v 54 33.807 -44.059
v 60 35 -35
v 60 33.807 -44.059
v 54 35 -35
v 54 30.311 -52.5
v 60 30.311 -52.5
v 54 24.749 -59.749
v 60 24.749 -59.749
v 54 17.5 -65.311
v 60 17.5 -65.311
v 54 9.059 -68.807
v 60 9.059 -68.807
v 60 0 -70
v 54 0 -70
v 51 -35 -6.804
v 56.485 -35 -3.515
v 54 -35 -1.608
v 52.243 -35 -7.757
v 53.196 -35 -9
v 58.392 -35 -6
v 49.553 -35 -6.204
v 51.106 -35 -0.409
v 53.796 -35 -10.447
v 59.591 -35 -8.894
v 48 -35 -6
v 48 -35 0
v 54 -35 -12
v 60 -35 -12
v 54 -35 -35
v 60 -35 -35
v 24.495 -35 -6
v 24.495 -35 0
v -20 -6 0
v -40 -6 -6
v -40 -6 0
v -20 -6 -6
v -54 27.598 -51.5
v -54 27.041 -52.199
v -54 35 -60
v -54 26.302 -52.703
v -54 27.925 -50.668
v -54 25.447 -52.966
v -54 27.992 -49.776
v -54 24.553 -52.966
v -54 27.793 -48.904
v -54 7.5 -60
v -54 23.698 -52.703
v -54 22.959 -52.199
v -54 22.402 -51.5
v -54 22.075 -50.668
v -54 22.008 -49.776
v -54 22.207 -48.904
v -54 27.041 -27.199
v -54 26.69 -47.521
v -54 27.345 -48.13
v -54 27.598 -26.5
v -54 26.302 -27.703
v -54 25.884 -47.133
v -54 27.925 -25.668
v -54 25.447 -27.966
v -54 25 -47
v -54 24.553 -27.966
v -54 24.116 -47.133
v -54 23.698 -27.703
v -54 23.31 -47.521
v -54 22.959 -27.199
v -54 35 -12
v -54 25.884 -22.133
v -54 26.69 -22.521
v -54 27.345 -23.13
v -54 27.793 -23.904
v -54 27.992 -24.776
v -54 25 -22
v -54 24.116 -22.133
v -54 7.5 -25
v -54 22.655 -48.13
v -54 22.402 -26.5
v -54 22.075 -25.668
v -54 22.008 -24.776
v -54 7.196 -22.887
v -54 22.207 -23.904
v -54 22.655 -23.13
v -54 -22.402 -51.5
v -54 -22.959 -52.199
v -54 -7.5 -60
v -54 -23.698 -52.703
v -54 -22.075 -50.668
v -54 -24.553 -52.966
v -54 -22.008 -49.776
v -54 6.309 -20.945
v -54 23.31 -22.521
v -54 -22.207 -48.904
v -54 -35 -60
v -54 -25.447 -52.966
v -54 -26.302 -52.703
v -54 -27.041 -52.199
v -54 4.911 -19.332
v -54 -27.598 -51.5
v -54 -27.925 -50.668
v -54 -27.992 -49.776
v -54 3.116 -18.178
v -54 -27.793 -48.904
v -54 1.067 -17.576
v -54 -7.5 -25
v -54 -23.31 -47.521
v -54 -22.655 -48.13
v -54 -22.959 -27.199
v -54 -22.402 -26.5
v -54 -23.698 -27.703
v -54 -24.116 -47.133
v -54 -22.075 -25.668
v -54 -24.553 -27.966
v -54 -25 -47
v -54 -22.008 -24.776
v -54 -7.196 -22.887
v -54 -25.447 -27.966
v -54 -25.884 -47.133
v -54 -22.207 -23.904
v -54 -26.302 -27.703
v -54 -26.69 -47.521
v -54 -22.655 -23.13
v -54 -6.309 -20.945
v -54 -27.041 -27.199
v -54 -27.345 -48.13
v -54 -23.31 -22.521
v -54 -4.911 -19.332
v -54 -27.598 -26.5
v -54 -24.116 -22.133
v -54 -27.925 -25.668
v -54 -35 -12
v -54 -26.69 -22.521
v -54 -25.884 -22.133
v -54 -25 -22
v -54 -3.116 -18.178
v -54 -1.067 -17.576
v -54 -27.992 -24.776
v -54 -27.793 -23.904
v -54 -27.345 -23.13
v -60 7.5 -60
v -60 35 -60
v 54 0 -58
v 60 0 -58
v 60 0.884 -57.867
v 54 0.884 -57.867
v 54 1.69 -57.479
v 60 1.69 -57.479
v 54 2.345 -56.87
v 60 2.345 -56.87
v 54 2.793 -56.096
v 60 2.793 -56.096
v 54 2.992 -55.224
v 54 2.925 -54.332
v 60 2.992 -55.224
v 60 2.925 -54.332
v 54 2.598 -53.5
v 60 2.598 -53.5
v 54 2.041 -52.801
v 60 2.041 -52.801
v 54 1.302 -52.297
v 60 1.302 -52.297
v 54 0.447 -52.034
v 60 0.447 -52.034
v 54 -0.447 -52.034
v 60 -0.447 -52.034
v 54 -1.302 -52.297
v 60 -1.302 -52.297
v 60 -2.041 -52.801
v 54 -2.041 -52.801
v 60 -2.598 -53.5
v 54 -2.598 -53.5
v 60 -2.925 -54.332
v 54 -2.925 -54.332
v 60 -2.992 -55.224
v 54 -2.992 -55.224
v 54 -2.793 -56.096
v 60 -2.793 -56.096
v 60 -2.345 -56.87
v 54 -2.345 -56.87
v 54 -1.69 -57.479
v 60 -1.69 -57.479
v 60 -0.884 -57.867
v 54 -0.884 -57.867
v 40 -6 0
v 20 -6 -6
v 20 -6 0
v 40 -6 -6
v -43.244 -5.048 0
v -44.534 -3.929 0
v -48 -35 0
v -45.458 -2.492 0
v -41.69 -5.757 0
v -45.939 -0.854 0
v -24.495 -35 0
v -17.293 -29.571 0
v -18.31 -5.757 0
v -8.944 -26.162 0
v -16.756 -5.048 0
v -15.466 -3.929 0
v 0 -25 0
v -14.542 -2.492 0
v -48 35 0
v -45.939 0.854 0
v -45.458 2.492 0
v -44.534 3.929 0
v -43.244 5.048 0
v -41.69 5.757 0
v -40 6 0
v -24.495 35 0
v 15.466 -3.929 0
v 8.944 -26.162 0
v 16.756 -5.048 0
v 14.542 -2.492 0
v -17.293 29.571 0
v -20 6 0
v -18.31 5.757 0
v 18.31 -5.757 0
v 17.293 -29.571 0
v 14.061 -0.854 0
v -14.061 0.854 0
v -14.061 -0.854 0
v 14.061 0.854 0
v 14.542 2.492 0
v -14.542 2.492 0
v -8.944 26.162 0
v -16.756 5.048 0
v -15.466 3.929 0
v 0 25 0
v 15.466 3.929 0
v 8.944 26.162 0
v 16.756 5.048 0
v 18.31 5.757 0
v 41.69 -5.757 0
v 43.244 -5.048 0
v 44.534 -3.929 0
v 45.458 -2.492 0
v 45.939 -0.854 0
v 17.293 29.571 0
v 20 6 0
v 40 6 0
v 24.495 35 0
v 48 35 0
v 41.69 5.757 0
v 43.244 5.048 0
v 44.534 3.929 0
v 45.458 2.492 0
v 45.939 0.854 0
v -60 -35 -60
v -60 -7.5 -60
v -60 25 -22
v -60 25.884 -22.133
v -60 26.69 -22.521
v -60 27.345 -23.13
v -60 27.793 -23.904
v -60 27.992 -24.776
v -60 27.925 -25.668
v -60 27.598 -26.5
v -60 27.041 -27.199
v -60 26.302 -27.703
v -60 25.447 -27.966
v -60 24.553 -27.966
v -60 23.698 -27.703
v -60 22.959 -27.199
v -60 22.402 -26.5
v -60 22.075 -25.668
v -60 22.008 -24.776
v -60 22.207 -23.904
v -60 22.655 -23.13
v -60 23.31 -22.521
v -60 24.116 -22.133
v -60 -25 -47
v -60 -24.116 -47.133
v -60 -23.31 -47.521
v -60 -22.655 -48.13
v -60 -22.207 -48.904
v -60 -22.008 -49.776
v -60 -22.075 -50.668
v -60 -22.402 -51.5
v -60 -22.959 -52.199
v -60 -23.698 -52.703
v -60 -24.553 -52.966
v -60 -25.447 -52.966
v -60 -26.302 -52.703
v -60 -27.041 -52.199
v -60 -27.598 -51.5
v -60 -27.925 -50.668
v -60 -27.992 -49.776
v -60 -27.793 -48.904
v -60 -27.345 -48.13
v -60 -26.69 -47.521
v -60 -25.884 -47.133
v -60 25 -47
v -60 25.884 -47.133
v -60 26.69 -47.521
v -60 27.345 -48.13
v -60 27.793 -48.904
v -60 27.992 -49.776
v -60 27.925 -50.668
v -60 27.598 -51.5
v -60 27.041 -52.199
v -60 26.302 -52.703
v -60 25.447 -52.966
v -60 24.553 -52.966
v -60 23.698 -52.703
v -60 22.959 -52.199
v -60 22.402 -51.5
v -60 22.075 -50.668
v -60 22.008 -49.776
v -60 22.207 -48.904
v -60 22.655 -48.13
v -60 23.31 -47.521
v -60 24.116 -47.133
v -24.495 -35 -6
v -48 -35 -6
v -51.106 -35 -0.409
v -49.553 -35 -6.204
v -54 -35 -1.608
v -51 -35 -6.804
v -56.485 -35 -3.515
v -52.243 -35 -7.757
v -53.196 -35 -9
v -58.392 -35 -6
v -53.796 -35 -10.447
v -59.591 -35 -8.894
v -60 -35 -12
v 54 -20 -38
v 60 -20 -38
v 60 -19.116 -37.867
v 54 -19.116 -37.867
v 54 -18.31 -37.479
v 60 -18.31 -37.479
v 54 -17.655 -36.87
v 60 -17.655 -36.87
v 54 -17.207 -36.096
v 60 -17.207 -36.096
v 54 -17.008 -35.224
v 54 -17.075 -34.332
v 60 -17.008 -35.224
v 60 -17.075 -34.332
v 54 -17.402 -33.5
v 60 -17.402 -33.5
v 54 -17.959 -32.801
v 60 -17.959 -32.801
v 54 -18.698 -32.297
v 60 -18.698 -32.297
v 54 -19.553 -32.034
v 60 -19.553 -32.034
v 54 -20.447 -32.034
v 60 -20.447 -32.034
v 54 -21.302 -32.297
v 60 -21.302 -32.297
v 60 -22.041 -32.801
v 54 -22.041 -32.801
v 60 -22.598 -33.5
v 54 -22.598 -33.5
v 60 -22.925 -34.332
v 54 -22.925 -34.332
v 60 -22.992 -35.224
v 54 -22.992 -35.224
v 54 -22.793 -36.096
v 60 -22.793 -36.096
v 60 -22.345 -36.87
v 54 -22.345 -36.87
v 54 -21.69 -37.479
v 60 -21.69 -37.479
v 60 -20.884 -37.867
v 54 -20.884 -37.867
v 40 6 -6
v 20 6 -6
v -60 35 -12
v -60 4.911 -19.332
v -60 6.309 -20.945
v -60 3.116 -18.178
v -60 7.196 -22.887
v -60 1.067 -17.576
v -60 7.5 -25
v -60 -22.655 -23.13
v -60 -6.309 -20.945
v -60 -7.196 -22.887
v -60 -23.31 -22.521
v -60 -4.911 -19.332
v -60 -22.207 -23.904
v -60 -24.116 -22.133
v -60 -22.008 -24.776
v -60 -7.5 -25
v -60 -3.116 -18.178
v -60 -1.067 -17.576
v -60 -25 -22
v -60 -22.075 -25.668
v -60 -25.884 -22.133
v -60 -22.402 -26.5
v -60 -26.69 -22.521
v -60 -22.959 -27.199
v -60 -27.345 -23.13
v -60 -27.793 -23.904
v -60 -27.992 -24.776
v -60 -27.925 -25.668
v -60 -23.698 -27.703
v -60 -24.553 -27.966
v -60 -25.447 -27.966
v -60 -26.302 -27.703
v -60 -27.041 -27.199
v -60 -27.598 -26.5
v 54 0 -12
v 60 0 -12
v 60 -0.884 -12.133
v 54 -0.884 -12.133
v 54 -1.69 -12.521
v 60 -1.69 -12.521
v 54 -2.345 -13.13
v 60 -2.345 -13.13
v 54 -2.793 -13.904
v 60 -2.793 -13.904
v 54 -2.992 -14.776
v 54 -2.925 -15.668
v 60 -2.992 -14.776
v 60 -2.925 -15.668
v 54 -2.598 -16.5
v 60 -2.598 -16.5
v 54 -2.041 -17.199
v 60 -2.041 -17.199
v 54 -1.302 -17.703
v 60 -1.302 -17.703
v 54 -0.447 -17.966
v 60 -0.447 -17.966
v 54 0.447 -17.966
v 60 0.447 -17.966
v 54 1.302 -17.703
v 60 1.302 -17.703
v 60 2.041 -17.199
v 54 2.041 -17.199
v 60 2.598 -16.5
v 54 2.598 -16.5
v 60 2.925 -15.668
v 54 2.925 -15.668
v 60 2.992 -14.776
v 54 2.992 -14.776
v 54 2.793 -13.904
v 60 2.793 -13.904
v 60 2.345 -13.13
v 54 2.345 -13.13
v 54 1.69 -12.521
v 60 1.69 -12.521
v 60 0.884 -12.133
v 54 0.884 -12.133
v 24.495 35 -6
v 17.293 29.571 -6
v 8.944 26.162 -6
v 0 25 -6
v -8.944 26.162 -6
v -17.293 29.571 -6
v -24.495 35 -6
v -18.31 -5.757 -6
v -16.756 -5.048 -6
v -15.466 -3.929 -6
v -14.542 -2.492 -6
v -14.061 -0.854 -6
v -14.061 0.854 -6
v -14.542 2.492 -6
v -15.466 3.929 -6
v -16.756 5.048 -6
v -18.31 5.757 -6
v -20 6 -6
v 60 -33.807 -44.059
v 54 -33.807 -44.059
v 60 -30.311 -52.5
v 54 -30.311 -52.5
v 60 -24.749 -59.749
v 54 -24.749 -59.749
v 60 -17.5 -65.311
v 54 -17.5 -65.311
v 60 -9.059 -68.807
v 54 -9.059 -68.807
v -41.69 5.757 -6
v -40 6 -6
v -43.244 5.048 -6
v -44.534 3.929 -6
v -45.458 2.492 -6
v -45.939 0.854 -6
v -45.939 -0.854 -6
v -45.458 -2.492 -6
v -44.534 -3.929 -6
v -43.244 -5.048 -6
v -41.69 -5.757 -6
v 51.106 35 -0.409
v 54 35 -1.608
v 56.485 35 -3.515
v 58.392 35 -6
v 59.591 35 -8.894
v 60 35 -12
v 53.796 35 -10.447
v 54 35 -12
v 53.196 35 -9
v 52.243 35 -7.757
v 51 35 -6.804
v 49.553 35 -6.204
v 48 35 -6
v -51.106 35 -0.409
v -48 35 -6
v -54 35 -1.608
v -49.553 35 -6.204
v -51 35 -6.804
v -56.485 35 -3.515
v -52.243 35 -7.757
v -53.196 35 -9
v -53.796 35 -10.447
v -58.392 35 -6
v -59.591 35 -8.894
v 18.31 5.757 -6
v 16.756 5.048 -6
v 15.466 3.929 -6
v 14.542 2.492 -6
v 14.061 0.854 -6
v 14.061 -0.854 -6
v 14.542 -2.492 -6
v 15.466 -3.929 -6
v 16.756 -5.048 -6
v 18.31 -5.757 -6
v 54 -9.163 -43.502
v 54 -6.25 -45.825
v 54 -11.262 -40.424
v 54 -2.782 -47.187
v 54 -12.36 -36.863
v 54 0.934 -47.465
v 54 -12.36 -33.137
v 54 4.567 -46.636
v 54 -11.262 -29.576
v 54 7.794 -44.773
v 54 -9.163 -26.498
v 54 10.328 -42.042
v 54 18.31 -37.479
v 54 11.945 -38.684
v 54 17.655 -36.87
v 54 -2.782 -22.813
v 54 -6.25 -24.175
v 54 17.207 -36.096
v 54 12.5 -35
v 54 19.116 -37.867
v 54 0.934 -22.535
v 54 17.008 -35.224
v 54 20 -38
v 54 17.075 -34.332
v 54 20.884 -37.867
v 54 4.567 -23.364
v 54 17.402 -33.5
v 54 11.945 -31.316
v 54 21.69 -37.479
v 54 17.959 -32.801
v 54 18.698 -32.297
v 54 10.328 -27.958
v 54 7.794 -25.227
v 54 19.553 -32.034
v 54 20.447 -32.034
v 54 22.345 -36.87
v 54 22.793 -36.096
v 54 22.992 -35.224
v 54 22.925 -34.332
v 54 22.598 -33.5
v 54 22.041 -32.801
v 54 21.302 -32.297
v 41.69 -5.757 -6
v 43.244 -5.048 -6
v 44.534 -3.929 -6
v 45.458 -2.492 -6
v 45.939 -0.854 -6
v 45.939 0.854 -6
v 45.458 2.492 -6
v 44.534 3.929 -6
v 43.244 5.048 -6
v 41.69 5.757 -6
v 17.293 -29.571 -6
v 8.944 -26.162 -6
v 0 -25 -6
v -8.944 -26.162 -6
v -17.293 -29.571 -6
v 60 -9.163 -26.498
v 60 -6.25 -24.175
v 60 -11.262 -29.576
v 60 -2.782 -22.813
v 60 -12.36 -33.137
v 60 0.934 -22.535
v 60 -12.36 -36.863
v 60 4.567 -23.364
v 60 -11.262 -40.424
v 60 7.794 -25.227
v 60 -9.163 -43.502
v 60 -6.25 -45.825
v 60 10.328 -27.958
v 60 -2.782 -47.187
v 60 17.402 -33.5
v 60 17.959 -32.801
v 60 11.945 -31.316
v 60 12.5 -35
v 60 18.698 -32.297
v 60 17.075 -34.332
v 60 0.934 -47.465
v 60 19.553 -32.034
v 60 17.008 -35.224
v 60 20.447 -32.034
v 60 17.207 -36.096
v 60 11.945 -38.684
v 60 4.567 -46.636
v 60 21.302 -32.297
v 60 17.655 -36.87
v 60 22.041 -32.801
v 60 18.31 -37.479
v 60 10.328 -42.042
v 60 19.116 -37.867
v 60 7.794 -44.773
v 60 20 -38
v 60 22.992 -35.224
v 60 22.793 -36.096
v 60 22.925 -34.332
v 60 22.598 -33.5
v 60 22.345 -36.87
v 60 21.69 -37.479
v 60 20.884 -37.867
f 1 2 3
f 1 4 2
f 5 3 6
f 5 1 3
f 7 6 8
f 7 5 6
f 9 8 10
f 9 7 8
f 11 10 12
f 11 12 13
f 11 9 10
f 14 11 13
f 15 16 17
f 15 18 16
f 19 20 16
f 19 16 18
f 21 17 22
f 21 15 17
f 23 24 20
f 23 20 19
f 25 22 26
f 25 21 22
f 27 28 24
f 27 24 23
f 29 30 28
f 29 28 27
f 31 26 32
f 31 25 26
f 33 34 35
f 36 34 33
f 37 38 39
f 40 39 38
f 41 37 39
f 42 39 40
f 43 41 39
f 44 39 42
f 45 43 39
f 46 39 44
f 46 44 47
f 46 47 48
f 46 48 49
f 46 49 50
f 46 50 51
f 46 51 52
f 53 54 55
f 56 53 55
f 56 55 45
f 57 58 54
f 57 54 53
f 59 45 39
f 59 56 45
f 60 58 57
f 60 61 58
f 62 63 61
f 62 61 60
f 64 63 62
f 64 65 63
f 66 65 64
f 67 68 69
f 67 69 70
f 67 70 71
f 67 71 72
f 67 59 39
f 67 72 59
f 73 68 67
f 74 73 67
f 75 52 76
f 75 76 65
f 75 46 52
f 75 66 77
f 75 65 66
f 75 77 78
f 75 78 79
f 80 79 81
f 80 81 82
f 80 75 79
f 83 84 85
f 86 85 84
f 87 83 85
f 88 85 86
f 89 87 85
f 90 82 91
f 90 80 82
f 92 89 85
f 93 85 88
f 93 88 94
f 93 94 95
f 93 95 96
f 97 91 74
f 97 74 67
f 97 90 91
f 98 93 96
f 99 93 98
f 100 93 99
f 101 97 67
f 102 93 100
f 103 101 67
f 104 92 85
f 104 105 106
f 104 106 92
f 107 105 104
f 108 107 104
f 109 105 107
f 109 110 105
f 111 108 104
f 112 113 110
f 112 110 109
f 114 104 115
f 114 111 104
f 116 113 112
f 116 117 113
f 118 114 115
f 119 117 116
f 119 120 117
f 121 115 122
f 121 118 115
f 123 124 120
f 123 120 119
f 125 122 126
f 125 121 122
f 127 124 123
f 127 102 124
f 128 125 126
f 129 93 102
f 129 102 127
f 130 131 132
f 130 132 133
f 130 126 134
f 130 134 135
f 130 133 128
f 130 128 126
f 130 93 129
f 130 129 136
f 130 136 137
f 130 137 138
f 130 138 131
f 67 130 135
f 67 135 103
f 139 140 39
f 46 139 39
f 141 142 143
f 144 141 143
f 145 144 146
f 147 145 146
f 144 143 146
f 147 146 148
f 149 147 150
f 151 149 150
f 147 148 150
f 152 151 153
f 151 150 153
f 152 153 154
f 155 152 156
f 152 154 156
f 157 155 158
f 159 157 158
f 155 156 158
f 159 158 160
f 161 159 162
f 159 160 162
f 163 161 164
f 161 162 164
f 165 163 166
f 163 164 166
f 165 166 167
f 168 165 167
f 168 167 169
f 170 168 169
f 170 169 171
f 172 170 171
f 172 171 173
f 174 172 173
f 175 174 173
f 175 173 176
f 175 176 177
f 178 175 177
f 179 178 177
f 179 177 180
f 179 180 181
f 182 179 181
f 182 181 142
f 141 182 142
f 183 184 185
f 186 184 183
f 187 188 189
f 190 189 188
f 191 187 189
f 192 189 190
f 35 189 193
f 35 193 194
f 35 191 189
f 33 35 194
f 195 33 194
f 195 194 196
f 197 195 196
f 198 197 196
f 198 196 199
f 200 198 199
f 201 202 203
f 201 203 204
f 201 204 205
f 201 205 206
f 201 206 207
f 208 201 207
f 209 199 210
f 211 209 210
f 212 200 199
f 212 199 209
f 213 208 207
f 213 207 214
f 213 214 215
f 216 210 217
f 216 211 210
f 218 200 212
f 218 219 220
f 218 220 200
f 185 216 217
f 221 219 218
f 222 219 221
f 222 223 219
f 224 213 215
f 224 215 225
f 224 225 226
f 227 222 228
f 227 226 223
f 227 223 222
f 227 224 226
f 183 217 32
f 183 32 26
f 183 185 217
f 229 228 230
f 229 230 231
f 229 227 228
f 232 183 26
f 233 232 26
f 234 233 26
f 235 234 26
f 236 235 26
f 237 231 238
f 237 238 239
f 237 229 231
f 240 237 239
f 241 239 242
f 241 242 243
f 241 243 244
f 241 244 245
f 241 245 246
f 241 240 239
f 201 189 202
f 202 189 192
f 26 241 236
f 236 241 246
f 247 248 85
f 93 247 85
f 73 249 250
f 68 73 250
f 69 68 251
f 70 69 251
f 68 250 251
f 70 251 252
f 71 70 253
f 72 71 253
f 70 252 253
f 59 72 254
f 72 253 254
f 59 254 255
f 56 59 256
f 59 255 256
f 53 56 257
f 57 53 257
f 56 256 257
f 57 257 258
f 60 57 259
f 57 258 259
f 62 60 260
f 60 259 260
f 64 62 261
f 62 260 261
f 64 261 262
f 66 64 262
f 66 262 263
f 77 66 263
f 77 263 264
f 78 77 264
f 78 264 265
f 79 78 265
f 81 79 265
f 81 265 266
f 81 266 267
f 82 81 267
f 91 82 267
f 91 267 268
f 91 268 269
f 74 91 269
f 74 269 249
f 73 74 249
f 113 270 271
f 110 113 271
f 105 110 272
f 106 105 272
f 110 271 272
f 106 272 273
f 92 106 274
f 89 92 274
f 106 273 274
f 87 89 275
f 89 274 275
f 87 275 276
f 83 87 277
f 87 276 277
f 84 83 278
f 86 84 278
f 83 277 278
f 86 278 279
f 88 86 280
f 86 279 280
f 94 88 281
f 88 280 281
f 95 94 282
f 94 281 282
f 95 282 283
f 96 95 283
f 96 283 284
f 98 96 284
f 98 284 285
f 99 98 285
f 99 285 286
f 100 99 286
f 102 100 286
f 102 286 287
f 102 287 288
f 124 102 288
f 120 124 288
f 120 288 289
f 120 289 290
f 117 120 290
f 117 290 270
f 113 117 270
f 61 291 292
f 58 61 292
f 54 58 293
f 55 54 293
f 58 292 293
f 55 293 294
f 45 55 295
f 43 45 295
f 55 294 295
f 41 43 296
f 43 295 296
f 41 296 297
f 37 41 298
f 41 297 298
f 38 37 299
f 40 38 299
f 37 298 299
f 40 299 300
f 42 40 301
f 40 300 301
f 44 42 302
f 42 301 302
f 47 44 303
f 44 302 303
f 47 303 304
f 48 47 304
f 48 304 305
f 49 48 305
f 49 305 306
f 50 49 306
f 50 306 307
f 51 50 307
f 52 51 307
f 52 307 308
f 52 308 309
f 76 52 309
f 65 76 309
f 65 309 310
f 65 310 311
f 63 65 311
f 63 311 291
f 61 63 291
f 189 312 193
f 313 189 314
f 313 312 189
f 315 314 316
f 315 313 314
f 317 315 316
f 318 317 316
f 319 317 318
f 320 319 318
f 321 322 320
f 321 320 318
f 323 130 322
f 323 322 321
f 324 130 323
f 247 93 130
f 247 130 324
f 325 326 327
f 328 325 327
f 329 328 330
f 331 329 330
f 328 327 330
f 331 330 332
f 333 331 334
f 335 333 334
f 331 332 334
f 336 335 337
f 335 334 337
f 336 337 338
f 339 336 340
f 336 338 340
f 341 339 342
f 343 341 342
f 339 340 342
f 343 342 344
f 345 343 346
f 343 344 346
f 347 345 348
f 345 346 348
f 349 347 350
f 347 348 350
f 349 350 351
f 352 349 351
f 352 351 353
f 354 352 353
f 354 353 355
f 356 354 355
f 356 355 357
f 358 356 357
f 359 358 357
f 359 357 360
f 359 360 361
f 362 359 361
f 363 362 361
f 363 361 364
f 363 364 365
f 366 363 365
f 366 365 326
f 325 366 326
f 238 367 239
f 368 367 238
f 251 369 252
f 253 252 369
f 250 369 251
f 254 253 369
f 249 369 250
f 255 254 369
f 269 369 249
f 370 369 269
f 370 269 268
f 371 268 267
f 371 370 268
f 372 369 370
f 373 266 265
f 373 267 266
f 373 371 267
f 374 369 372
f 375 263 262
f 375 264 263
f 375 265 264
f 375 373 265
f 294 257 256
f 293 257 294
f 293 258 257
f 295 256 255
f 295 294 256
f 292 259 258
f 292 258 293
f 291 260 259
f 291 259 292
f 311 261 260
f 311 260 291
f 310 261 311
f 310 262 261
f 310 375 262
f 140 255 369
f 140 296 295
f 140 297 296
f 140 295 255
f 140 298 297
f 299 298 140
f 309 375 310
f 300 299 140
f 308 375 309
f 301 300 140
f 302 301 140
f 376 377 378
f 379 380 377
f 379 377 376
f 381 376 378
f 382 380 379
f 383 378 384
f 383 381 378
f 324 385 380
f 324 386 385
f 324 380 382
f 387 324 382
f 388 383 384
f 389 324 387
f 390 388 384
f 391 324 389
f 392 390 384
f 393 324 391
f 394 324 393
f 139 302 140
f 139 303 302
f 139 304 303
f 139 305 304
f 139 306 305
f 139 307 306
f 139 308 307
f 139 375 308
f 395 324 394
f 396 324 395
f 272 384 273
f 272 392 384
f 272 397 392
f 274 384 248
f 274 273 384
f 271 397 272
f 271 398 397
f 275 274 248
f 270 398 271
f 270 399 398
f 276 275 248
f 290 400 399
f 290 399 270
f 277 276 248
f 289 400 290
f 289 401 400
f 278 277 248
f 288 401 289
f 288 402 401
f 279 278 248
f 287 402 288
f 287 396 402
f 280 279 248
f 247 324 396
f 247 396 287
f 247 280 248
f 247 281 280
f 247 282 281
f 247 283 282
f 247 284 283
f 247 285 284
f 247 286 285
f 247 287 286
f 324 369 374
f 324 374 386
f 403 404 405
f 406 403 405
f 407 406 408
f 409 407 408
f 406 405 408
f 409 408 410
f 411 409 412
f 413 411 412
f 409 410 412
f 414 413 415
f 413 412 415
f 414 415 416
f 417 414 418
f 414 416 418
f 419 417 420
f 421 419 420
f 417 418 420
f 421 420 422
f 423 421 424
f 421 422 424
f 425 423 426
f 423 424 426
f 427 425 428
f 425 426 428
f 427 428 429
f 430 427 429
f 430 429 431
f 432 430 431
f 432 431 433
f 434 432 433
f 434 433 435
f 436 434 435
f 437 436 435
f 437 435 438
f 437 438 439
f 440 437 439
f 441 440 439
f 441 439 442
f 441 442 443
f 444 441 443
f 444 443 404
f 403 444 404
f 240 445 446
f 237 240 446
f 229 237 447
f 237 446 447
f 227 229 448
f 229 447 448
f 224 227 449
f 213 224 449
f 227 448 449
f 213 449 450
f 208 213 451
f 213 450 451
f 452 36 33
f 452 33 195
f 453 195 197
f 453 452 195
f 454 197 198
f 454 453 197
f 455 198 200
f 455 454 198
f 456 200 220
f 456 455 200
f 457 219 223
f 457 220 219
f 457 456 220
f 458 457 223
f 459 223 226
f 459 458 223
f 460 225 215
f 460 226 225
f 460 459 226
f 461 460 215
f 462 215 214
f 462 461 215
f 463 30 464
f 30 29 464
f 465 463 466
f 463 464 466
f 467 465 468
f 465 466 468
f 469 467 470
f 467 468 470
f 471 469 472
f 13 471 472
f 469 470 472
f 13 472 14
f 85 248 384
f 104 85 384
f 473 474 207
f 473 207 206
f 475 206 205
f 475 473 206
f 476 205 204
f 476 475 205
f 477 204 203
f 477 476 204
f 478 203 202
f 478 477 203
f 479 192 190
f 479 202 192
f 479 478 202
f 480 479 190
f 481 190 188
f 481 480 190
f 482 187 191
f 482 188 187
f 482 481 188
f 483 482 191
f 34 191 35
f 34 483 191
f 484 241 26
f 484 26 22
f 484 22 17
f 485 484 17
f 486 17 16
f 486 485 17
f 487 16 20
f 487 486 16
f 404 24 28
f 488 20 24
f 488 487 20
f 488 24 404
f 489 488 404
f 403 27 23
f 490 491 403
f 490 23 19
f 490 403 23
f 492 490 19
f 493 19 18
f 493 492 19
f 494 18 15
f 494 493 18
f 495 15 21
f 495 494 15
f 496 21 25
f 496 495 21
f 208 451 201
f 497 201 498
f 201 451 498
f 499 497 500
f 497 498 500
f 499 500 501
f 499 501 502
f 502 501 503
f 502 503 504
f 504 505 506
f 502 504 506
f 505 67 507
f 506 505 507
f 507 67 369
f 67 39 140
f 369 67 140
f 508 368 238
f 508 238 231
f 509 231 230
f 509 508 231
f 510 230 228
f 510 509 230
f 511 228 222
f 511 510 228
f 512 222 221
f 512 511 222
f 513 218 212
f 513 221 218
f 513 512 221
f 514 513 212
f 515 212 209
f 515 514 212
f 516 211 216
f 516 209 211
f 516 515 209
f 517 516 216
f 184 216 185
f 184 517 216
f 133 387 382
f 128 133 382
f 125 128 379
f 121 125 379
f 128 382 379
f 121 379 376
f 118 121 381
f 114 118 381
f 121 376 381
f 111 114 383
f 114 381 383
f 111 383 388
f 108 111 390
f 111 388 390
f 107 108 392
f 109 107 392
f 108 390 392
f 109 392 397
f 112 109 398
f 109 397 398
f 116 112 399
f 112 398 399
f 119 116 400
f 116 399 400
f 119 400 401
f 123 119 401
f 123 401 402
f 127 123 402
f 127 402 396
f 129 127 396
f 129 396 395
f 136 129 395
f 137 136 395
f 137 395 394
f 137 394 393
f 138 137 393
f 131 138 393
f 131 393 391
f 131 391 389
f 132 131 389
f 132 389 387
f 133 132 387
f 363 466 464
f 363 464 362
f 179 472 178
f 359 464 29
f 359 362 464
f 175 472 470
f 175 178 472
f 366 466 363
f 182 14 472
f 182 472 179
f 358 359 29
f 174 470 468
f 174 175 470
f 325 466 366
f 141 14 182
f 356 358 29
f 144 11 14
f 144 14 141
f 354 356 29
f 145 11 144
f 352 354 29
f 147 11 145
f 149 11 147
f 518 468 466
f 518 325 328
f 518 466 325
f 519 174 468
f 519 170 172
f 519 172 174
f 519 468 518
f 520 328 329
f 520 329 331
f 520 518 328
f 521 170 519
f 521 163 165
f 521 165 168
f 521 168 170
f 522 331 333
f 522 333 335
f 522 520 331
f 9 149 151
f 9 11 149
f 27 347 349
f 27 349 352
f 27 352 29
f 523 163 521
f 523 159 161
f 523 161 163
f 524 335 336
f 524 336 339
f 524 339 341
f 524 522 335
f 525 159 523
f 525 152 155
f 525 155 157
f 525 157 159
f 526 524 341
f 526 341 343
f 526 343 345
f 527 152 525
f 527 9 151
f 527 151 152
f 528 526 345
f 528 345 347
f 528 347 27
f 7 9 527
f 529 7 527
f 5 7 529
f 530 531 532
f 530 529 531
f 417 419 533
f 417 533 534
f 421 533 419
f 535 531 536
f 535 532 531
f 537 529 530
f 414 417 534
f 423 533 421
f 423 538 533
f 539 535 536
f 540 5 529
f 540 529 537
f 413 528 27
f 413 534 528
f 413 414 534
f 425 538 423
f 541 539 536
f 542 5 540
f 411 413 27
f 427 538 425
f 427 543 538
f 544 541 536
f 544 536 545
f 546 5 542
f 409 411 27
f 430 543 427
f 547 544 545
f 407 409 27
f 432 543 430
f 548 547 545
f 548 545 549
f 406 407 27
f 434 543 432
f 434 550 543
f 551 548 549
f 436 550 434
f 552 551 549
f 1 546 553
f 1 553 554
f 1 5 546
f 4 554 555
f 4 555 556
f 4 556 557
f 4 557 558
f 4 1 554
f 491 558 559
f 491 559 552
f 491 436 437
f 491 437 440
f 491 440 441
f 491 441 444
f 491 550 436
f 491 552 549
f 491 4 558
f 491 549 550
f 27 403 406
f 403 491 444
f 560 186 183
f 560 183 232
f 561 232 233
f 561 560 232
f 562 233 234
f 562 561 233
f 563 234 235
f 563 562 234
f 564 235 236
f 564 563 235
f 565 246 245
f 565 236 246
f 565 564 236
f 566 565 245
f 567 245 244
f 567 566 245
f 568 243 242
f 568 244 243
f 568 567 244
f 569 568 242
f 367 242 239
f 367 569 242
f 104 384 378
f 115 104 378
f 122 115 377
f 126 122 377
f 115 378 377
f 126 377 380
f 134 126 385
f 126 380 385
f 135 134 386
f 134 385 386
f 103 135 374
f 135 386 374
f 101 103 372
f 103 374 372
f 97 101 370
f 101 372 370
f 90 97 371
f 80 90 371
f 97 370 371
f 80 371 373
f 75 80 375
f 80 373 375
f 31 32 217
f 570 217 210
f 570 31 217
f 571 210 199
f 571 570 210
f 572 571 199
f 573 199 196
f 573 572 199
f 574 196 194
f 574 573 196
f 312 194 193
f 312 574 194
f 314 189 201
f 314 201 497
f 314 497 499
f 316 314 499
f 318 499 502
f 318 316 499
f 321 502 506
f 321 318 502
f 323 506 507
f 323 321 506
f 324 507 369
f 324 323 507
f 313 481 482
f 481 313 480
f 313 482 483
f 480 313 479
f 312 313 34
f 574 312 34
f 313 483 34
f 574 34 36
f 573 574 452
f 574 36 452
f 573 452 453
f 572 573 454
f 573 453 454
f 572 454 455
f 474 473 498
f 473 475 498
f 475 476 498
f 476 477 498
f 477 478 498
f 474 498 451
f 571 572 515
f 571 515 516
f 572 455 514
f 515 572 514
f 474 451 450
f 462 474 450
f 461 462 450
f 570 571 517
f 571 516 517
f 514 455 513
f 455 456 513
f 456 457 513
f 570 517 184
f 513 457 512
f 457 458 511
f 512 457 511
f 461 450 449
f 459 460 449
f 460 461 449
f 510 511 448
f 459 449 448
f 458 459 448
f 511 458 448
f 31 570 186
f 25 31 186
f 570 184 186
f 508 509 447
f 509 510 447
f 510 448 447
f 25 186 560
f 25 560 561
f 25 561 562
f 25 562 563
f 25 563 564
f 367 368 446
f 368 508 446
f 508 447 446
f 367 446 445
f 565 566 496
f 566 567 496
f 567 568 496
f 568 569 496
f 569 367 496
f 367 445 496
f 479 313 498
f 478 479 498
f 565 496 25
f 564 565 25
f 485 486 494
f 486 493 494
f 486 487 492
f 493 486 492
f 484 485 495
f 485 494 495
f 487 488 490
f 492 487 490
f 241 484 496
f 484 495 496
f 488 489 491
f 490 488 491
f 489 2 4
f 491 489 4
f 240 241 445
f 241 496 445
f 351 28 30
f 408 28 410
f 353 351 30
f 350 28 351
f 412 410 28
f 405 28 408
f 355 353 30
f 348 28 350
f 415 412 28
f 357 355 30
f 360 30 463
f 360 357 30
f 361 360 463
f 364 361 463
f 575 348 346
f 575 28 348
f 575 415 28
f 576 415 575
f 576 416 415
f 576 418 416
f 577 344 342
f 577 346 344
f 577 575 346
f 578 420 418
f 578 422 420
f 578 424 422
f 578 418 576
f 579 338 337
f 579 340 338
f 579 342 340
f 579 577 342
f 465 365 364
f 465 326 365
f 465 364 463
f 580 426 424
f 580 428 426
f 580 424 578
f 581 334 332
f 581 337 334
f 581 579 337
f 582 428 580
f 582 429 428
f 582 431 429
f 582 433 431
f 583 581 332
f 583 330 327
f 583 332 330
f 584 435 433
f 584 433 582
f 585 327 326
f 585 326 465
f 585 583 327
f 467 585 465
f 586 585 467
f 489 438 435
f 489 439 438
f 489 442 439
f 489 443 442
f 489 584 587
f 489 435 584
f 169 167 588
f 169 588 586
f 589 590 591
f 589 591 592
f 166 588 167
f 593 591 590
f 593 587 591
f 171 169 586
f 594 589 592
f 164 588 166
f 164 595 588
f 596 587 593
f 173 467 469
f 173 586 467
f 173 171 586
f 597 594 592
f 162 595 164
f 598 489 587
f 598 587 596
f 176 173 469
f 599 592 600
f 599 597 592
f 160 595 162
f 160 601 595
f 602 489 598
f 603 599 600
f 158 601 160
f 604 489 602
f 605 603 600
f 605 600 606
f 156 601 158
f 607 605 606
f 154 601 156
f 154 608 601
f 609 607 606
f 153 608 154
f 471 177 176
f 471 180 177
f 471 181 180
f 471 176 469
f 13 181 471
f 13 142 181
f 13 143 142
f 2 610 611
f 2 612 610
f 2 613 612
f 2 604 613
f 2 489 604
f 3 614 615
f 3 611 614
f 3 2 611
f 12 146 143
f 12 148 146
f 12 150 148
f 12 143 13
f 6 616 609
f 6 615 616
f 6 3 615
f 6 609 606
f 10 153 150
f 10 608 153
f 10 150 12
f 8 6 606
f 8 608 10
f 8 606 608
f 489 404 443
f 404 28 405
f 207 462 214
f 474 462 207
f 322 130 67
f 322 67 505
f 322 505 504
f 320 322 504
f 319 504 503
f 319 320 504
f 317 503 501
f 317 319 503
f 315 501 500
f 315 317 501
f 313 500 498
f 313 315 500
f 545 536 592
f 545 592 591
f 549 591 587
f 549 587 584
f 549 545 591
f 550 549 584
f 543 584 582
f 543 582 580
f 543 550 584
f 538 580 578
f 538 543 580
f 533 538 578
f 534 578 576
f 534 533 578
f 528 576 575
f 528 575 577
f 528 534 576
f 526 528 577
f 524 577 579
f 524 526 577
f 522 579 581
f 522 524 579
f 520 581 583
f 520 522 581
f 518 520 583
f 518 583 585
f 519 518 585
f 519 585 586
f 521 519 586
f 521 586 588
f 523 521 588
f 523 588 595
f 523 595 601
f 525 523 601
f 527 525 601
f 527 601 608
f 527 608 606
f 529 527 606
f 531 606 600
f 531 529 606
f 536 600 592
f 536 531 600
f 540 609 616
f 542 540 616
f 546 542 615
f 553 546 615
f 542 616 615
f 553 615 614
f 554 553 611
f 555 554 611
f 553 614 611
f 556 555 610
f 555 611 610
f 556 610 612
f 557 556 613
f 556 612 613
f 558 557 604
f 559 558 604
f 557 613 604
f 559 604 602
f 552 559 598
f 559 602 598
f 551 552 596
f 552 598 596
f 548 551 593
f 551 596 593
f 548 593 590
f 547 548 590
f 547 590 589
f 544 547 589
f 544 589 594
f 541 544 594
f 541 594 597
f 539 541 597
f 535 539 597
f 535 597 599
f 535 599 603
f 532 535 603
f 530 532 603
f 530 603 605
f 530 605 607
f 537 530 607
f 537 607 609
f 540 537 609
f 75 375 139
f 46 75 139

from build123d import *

# Parameters (mm, degrees)
SKETCH1_W                    = 108
SKETCH1_H                    = 70
BASE_FLANGE1_DEPTH           = 6
EDGE_FLANGE1_STRIP_W         = 36
EDGE_FLANGE1_STRIP_H         = 6
EDGE_FLANGE1_STRIP_CUT_DEPTH = 70
EDGE_FLANGE1_DEPTH           = 70
EDGE_FLANGE2_STRIP_W         = 36
EDGE_FLANGE2_STRIP_H         = 6
EDGE_FLANGE2_STRIP_CUT_DEPTH = 70
EDGE_FLANGE2_DEPTH           = 70
FILLET1_R                    = 35
CUT_EXTRUDE1_DEPTH           = 6
SKETCH15_R                   = 3
CUT_EXTRUDE2_DEPTH           = 7
LPATTERN1_COUNT              = 2
LPATTERN1_PITCH              = 50
CUT_EXTRUDE3_DEPTH           = 7
LPATTERN2_COUNT              = 2
LPATTERN2_PITCH              = 60
CUT_EXTRUDE4_DEPTH           = 8
SKETCH27_R                   = 3
CUT_EXTRUDE6_DEPTH           = 8
HOLE2_START                  = 54
HOLE2_OUTLINE_R              = 12.5
HOLE2_DEPTH                  = 6


# Read off the part's stored shape, not the designer's step: Hole2
# Sheet-metal steps are written as plain solids
with BuildPart() as part:
    # Sketch1 → Base-Flange1 (new body)
    with BuildSketch(Plane.XY):
        Rectangle(SKETCH1_W, SKETCH1_H)
    extrude(amount=-BASE_FLANGE1_DEPTH)

    # Edge-Flange1 strip (across the edge) → Edge-Flange1 strip cut (cut)
    with BuildSketch(Plane(origin=(54, 35, -6), x_dir=(-1, 0, 0), z_dir=(0, -1, 0))):
        with Locations((-12, -3)):
            Rectangle(EDGE_FLANGE1_STRIP_W, EDGE_FLANGE1_STRIP_H)
    extrude(amount=EDGE_FLANGE1_STRIP_CUT_DEPTH, mode=Mode.SUBTRACT)

    # Edge-Flange1 section (across the edge) → Edge-Flange1 (add)
    with BuildSketch(Plane(origin=(54, 35, -6), x_dir=(-1, 0, 0), z_dir=(0, -1, 0))):
        with BuildLine():
            Line((-6, 6), (-6, 64))
            Line((-6, 64), (0, 64))
            Line((0, 64), (0, 6))
            ThreePointArc((0, 6), (1.757359313, 1.757359313), (6, 0))
            Line((6, 0), (6, -6))
            ThreePointArc((6, -6), (-2.485281374, -2.485281374), (-6, 6))
        make_face()
    extrude(amount=EDGE_FLANGE1_DEPTH)

    # Edge-Flange2 strip (across the edge) → Edge-Flange2 strip cut (cut)
    with BuildSketch(Plane(origin=(-54, -35, -6), x_dir=(1, 0, 0), z_dir=(0, 1, 0))):
        with Locations((-12, -3)):
            Rectangle(EDGE_FLANGE2_STRIP_W, EDGE_FLANGE2_STRIP_H)
    extrude(amount=EDGE_FLANGE2_STRIP_CUT_DEPTH, mode=Mode.SUBTRACT)

    # Edge-Flange2 section (across the edge) → Edge-Flange2 (add)
    with BuildSketch(Plane(origin=(-54, -35, -6), x_dir=(1, 0, 0), z_dir=(0, 1, 0))):
        with BuildLine():
            Line((-6, 6), (-6, 54))
            Line((-6, 54), (0, 54))
            Line((0, 54), (0, 6))
            ThreePointArc((0, 6), (1.757359313, 1.757359313), (6, 0))
            Line((6, 0), (6, -6))
            ThreePointArc((6, -6), (-2.485281374, -2.485281374), (-6, 6))
        make_face()
    extrude(amount=EDGE_FLANGE2_DEPTH)

    # Fillet1
    fillet1_edges = [part.edges().sort_by_distance(p)[0] for p in [
        (57, -35, -70),
        (57, 35, -70),
    ]]
    fillet(fillet1_edges, radius=FILLET1_R - 0.0001)  # a hair under: the kernel refuses the full size

    # Sketch14 → Cut-Extrude1 (cut)
    with BuildSketch(Plane.ZY.offset(60)):
        with BuildLine():
            Line((-60, 7.5), (-60, -7.5))
            Line((-60, -7.5), (-25, -7.5))
            ThreePointArc((-25, -7.5), (-17.5, 0), (-25, 7.5))
            Line((-25, 7.5), (-60, 7.5))
        make_face()
    extrude(amount=-CUT_EXTRUDE1_DEPTH, mode=Mode.SUBTRACT)

    # Sketch15 → Cut-Extrude2 (cut)
    with BuildSketch(Plane.ZY.offset(60)):
        with Locations((-50, 25)):
            Circle(SKETCH15_R)
        with Locations((-25, 25)):
            Circle(SKETCH15_R)
    cut_extrude2 = extrude(amount=-CUT_EXTRUDE2_DEPTH, mode=Mode.SUBTRACT)

    # LPattern1: Cut-Extrude2 ×2
    with Locations(*[(0, -i * LPATTERN1_PITCH, 0) for i in range(1, LPATTERN1_COUNT)]):
        add(cut_extrude2, mode=Mode.SUBTRACT)

    # Sketch16 → Cut-Extrude3 (cut)
    with BuildSketch(Plane(origin=(0, 0, -6), x_dir=(-1, 0, 0), z_dir=(0, 0, -1))):
        with BuildLine():
            Line((-40, 6), (-20, 6))
            ThreePointArc((-20, 6), (-14, 0), (-20, -6))
            Line((-20, -6), (-40, -6))
            ThreePointArc((-40, -6), (-46, 0), (-40, 6))
        make_face()
    cut_extrude3 = extrude(amount=-CUT_EXTRUDE3_DEPTH, mode=Mode.SUBTRACT)

    # LPattern2: Cut-Extrude3 ×2
    with Locations(*[(-i * LPATTERN2_PITCH, 0, 0) for i in range(1, LPATTERN2_COUNT)]):
        add(cut_extrude3, mode=Mode.SUBTRACT)

    # Sketch18 → Cut-Extrude4 (cut)
    with BuildSketch(Plane(origin=(0, 0, -6), x_dir=(-1, 0, 0), z_dir=(0, 0, -1))):
        with BuildLine():
            Line((24.494897428, -35), (-24.494897428, -35))
            ThreePointArc((-24.494897428, -35), (0, -25), (24.494897428, -35))
        make_face()
    cut_extrude4 = extrude(amount=-CUT_EXTRUDE4_DEPTH, mode=Mode.SUBTRACT)

    # Sketch27 → Cut-Extrude6 (cut)
    with BuildSketch(Plane(origin=(60, 0, 0), x_dir=(0, 0, -1), z_dir=(1, 0, 0))):
        with Locations((55, 0)):
            Circle(SKETCH27_R)
        with Locations((35, 20)):
            Circle(SKETCH27_R)
        with Locations(Location((15, 0, 0), (0, 0, 180))):
            Circle(SKETCH27_R)
        with Locations((35, -20)):
            Circle(SKETCH27_R)
    extrude(amount=-CUT_EXTRUDE6_DEPTH, mode=Mode.SUBTRACT)

    # Hole2 outline → Hole2 (cut)
    with BuildSketch(Plane.YZ.offset(HOLE2_START)):
        with Locations((0, -35)):
            Circle(HOLE2_OUTLINE_R)
    extrude(amount=HOLE2_DEPTH, mode=Mode.SUBTRACT)

    # Mirror2: Cut-Extrude4 across plane
    add(cut_extrude4.mirror(Plane.ZX), mode=Mode.SUBTRACT)


solid = part.part
